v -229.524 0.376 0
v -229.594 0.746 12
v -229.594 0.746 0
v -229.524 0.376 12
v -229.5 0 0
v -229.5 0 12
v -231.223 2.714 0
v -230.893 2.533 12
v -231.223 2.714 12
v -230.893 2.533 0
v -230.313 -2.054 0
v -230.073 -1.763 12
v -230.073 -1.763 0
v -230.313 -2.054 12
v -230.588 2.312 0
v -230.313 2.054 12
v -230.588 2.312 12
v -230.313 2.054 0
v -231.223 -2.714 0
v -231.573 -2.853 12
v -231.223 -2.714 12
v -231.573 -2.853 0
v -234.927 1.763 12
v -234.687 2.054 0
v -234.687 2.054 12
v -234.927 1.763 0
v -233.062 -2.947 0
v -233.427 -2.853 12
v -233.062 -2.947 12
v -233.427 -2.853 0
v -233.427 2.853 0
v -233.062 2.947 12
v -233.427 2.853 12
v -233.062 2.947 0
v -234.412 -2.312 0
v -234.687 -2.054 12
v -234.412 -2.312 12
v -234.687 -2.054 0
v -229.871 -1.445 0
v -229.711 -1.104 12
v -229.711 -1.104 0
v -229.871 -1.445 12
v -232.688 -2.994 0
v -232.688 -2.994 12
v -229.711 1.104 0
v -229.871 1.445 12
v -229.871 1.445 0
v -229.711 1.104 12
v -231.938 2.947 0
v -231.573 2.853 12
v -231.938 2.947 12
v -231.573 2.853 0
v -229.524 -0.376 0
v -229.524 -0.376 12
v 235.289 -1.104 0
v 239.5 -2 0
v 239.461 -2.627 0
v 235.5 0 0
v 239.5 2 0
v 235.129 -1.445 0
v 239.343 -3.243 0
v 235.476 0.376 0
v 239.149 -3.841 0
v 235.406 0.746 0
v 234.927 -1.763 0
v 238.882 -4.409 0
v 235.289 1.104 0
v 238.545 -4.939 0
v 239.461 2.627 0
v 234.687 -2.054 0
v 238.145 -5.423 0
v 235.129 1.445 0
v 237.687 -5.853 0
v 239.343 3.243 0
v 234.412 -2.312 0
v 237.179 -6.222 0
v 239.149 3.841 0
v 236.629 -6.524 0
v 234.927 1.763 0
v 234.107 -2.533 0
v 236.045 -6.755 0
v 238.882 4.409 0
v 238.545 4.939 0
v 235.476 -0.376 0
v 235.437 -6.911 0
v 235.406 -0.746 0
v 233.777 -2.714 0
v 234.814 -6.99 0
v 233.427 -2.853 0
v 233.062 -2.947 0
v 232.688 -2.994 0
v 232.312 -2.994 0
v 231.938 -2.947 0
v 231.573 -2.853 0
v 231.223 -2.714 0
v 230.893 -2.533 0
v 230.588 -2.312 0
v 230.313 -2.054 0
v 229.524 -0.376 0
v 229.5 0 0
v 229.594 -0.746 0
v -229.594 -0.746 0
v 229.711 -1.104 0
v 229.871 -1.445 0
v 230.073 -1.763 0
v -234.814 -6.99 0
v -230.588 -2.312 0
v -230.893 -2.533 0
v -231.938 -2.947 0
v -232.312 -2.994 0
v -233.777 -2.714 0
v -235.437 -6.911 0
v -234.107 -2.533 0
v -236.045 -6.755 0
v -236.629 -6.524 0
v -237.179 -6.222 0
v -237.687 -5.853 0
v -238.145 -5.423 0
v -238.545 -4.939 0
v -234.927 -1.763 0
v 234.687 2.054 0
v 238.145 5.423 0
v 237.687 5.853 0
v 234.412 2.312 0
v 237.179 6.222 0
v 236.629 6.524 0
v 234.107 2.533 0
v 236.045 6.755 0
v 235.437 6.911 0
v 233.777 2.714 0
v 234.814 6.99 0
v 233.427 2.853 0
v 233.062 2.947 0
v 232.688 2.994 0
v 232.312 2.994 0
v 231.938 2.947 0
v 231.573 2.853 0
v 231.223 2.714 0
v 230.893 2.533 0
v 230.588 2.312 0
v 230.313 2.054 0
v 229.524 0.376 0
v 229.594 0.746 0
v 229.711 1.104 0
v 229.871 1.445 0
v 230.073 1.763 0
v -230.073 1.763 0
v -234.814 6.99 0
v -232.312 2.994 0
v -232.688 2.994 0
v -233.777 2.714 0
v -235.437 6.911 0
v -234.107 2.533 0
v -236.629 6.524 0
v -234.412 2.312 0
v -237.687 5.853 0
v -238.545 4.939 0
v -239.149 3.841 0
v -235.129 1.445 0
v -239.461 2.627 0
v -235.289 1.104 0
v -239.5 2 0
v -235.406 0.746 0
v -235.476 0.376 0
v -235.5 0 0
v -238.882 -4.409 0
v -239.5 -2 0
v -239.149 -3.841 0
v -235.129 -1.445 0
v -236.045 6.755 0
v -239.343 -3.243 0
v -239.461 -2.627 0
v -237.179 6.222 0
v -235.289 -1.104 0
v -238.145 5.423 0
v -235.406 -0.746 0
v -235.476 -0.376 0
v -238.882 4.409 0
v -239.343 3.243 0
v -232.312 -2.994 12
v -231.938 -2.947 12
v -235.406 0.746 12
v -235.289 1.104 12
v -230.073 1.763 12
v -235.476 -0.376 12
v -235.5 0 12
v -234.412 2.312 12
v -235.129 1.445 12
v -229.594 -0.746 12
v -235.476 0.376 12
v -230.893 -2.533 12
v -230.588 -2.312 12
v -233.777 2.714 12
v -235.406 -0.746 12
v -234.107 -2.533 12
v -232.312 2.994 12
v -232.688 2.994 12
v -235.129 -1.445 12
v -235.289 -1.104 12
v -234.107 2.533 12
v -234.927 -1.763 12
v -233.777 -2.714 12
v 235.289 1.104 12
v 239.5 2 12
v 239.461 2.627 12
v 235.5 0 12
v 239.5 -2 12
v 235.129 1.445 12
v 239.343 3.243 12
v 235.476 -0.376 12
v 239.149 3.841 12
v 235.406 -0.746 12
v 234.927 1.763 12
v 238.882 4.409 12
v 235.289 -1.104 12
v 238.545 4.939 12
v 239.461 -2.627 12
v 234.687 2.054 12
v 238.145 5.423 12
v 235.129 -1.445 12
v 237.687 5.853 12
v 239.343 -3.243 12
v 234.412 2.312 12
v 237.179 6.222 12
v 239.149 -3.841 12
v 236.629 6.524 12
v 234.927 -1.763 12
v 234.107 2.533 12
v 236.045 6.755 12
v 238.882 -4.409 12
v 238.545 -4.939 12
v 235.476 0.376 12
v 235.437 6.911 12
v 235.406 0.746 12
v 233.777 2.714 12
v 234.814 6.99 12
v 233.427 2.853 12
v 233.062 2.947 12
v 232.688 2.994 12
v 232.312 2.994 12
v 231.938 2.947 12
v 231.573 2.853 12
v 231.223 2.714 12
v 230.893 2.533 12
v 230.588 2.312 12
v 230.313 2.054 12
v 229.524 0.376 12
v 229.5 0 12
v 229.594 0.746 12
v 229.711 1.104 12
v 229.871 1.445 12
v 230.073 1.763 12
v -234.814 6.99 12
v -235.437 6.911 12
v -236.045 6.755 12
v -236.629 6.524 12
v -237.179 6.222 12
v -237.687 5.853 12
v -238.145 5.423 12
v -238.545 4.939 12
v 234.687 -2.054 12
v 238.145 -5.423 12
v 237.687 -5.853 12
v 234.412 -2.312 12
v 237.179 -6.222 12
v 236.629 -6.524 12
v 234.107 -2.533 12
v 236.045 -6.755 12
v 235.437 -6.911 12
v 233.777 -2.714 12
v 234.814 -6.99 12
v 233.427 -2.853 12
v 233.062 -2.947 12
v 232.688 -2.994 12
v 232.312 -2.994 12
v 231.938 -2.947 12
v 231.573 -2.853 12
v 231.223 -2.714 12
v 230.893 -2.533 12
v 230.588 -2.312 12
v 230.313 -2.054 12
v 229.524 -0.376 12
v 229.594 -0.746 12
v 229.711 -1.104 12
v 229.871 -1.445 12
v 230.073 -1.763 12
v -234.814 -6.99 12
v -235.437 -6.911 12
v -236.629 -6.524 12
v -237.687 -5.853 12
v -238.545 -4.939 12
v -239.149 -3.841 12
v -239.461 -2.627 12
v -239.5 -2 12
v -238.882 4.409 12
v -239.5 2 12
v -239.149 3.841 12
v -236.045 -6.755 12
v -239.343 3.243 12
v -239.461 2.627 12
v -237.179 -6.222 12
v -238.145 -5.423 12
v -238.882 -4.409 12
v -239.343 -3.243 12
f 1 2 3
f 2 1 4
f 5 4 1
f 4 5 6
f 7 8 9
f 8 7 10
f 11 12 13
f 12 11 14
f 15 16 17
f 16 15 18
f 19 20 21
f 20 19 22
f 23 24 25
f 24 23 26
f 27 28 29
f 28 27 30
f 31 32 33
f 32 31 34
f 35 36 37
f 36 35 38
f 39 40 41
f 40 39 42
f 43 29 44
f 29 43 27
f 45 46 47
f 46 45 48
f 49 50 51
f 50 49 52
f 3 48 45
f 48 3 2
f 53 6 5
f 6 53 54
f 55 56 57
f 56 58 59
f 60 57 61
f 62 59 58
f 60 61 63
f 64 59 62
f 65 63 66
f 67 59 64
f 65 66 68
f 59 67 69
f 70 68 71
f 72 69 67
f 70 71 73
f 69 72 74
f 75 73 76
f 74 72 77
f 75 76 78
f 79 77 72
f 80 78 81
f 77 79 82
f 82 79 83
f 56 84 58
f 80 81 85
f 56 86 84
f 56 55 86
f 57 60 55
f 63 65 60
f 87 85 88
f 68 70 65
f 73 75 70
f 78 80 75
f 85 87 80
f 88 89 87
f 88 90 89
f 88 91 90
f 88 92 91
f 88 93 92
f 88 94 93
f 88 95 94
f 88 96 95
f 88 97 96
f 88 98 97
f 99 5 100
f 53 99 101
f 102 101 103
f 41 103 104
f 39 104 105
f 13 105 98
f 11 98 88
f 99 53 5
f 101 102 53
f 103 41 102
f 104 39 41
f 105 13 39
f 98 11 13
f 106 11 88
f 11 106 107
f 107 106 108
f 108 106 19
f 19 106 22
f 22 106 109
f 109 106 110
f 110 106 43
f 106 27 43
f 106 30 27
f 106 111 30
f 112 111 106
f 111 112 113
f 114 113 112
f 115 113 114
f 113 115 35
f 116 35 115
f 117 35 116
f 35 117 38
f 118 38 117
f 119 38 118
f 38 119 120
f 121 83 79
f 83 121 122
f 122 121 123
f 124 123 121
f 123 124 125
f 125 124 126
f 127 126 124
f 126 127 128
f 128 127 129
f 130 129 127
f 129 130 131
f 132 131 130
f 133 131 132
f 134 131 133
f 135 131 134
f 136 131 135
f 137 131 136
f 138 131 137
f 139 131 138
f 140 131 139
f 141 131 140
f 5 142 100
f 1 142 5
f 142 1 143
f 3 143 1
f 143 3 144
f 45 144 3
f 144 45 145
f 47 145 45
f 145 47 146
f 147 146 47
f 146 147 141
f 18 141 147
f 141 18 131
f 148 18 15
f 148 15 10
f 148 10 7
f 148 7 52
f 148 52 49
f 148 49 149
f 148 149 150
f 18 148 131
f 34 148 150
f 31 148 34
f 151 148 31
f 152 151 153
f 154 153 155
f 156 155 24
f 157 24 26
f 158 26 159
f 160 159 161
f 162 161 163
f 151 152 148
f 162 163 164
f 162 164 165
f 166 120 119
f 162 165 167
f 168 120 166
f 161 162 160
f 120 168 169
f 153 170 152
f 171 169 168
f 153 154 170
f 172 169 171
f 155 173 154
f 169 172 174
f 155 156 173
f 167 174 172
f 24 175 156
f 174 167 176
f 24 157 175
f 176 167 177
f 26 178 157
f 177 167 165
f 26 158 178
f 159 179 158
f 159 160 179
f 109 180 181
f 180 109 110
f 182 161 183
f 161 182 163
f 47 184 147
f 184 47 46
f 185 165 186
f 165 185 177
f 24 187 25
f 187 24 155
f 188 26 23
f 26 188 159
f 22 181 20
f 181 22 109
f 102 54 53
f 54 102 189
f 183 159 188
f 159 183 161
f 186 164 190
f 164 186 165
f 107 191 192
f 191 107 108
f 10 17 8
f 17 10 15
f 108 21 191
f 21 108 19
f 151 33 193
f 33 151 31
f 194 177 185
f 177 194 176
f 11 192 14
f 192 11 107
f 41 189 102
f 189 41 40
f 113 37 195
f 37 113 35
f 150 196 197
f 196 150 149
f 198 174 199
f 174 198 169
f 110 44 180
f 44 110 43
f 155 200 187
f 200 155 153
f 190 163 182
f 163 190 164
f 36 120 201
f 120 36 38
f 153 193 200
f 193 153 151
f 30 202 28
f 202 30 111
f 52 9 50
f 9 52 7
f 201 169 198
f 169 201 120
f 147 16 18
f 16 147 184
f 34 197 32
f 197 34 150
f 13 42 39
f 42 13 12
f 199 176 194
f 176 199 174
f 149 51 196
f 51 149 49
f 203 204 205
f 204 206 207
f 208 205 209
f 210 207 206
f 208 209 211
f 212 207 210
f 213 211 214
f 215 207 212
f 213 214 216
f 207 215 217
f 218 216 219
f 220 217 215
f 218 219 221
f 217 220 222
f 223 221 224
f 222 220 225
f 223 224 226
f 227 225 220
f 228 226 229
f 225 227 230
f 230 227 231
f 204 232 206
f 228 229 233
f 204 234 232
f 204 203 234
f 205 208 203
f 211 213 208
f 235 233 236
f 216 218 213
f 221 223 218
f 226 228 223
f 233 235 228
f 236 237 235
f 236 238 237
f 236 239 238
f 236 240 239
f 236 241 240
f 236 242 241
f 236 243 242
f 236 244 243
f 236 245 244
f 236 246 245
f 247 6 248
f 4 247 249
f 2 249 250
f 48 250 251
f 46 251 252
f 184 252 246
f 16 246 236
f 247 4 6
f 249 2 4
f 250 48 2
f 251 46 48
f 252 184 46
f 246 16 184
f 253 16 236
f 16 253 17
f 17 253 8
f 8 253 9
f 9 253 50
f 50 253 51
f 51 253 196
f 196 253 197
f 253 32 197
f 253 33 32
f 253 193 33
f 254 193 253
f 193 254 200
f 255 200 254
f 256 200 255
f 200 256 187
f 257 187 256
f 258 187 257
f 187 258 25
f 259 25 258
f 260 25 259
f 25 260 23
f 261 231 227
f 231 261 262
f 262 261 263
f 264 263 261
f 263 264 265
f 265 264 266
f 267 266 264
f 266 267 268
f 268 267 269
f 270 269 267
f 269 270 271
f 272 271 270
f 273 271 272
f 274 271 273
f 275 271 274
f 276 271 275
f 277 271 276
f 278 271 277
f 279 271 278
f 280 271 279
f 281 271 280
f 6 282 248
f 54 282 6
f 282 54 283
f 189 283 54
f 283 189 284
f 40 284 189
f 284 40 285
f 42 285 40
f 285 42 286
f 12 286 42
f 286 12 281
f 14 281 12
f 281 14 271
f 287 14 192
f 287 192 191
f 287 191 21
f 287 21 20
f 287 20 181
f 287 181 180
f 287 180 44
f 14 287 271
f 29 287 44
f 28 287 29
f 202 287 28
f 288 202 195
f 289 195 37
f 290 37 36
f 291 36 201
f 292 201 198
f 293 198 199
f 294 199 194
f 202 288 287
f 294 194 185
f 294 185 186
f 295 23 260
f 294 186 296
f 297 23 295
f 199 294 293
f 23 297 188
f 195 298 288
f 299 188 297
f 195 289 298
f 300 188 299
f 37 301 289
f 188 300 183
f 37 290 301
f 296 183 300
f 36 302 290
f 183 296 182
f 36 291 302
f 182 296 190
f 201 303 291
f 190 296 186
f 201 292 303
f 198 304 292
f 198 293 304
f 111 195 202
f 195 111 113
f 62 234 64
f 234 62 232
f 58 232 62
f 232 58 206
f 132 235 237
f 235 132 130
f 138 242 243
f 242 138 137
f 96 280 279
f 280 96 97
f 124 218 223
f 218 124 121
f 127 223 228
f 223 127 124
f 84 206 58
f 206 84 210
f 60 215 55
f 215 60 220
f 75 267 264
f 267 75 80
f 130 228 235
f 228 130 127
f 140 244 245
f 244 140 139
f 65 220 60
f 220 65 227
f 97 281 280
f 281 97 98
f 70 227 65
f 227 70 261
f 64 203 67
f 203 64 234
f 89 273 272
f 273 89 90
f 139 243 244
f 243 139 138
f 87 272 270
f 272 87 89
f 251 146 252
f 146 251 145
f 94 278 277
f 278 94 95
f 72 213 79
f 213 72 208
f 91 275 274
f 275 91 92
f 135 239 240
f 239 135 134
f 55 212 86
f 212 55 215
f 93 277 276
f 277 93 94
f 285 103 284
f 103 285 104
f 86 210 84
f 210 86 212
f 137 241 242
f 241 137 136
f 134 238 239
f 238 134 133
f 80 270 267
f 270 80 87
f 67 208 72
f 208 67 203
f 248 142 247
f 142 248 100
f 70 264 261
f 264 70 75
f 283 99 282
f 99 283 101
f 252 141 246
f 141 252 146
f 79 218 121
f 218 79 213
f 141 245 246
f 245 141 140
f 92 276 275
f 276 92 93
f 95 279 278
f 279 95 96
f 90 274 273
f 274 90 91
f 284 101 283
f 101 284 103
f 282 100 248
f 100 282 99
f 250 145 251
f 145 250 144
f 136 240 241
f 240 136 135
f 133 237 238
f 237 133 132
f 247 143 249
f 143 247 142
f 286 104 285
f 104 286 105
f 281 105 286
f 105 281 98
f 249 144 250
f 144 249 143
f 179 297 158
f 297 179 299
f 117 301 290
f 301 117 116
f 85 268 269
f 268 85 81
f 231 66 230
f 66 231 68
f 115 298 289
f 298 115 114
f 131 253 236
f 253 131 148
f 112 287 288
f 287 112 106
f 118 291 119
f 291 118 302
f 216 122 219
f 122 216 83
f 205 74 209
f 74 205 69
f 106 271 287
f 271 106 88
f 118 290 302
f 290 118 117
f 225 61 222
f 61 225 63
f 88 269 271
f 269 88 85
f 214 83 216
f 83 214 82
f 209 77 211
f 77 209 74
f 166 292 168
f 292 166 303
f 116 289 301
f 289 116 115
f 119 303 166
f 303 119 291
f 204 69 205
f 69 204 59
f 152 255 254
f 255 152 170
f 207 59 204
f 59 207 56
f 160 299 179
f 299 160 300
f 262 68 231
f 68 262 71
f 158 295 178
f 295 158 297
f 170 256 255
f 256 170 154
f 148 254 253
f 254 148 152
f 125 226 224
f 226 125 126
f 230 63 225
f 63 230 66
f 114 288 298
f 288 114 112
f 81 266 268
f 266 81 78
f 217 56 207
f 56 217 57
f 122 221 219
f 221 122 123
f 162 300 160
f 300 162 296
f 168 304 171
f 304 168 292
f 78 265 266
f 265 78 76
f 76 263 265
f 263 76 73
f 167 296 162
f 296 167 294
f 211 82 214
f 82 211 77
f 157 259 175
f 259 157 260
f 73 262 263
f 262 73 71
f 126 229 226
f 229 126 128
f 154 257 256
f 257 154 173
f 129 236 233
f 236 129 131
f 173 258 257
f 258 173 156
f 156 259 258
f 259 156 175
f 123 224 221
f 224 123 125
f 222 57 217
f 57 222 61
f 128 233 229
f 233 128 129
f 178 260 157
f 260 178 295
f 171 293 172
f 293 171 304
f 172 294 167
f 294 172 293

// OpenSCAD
$fn = 50;


difference() {
	union() {
		hull() {
			translate(v = [-234.5000000000, 2.0000000000, 0]) {
				cylinder(h = 12, r = 5);
			}
			translate(v = [234.5000000000, 2.0000000000, 0]) {
				cylinder(h = 12, r = 5);
			}
			translate(v = [-234.5000000000, -2.0000000000, 0]) {
				cylinder(h = 12, r = 5);
			}
			translate(v = [234.5000000000, -2.0000000000, 0]) {
				cylinder(h = 12, r = 5);
			}
		}
	}
	union() {
		translate(v = [-232.5000000000, 0.0000000000, 0]) {
			cylinder(h = 12, r = 3.0000000000);
		}
		translate(v = [232.5000000000, 0.0000000000, 0]) {
			cylinder(h = 12, r = 3.0000000000);
		}
		translate(v = [-232.5000000000, 0.0000000000, 0]) {
			cylinder(h = 12, r = 1.5000000000);
		}
		translate(v = [232.5000000000, 0.0000000000, 0]) {
			cylinder(h = 12, r = 1.5000000000);
		}
		translate(v = [-232.5000000000, 0.0000000000, 0]) {
			cylinder(h = 12, r = 1.5000000000);
		}
		translate(v = [232.5000000000, 0.0000000000, 0]) {
			cylinder(h = 12, r = 1.5000000000);
		}
		translate(v = [-232.5000000000, 0.0000000000, 0]) {
			cylinder(h = 12, r = 1.5000000000);
		}
		translate(v = [232.5000000000, 0.0000000000, 0]) {
			cylinder(h = 12, r = 1.5000000000);
		}
	}
}
